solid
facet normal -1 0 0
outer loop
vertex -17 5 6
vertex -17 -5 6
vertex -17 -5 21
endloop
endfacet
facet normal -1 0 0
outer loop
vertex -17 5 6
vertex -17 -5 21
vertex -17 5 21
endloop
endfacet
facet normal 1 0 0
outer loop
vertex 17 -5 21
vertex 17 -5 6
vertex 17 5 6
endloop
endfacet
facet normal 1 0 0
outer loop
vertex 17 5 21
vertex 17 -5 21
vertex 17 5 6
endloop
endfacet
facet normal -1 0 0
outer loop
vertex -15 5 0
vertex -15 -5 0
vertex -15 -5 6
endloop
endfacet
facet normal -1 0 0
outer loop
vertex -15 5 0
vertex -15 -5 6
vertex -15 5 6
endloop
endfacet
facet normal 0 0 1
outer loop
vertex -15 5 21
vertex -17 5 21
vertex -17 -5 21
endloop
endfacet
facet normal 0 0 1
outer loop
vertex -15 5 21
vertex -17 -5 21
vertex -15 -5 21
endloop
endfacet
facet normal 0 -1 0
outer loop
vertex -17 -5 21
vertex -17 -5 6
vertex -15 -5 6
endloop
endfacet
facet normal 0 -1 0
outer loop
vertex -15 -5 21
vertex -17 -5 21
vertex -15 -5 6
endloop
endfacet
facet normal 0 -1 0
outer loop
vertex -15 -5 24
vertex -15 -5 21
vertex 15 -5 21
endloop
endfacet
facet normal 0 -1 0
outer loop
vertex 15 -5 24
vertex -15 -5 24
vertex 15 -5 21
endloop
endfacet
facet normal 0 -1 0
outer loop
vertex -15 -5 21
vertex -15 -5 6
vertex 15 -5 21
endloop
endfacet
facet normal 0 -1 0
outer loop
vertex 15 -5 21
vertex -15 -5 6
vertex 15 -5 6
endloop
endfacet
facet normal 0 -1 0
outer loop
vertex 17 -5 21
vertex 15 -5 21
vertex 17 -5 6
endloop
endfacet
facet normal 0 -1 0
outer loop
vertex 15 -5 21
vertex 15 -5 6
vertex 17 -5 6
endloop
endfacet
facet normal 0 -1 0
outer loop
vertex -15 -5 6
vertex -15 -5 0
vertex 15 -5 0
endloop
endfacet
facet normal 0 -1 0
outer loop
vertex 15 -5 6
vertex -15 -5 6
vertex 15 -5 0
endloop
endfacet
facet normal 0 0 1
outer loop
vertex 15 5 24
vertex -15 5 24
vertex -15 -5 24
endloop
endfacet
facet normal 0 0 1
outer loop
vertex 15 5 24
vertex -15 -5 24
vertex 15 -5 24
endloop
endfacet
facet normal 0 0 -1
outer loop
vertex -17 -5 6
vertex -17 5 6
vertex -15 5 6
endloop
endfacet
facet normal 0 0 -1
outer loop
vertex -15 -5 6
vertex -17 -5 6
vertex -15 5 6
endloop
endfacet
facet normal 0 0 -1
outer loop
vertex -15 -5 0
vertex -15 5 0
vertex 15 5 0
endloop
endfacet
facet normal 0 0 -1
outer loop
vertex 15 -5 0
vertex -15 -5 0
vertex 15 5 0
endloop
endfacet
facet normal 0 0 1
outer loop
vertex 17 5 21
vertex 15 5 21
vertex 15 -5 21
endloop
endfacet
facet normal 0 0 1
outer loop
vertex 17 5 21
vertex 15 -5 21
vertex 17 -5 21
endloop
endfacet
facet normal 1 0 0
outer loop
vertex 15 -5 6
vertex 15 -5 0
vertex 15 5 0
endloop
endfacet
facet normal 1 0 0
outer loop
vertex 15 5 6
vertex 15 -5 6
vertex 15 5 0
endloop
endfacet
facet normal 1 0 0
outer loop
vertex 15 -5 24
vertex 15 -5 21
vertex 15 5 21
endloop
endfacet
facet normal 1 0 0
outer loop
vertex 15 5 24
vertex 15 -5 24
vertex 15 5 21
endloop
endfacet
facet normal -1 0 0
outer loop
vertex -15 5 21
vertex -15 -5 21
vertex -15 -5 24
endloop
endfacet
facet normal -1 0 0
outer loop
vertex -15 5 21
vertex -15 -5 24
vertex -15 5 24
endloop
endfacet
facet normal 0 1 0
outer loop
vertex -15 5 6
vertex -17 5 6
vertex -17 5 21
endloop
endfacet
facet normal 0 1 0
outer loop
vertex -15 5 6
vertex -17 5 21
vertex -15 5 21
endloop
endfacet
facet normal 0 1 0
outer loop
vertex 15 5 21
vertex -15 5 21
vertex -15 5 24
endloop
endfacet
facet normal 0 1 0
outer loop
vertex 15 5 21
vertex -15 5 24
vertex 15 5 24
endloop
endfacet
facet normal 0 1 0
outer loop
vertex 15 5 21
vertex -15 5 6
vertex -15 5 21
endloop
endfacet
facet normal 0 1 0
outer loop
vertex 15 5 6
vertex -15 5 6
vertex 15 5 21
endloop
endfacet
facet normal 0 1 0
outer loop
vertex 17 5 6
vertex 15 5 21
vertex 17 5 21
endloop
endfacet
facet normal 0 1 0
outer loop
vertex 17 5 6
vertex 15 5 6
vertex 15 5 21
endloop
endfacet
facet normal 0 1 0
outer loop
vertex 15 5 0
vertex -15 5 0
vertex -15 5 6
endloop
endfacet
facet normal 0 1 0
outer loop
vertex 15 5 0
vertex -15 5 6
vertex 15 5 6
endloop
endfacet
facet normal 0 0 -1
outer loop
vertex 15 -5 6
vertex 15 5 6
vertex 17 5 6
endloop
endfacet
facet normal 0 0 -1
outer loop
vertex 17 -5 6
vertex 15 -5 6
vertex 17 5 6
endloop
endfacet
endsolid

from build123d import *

# Parameters (mm, degrees)
F0_W     = 30
F0_H     = 10
F1_DEPTH = 6
F2_W     = 34
F2_H     = 10
F3_DEPTH = 15
F4_W     = 30
F4_H     = 10
F5_DEPTH = 3


with BuildPart() as f1:
    # F0 (on Top) → F1 (new body)
    with BuildSketch(Plane.XY):
        Rectangle(F0_W, F0_H)
    extrude(amount=F1_DEPTH)

    # F2 (on face) → F3 (join)
    with BuildSketch(Plane.XY.offset(6)):
        Rectangle(F2_W, F2_H)
    extrude(amount=F3_DEPTH)

    # F4 (on face) → F5 (join)
    with BuildSketch(Plane.XY.offset(21)):
        Rectangle(F4_W, F4_H)
    extrude(amount=F5_DEPTH)


solid = f1.part
